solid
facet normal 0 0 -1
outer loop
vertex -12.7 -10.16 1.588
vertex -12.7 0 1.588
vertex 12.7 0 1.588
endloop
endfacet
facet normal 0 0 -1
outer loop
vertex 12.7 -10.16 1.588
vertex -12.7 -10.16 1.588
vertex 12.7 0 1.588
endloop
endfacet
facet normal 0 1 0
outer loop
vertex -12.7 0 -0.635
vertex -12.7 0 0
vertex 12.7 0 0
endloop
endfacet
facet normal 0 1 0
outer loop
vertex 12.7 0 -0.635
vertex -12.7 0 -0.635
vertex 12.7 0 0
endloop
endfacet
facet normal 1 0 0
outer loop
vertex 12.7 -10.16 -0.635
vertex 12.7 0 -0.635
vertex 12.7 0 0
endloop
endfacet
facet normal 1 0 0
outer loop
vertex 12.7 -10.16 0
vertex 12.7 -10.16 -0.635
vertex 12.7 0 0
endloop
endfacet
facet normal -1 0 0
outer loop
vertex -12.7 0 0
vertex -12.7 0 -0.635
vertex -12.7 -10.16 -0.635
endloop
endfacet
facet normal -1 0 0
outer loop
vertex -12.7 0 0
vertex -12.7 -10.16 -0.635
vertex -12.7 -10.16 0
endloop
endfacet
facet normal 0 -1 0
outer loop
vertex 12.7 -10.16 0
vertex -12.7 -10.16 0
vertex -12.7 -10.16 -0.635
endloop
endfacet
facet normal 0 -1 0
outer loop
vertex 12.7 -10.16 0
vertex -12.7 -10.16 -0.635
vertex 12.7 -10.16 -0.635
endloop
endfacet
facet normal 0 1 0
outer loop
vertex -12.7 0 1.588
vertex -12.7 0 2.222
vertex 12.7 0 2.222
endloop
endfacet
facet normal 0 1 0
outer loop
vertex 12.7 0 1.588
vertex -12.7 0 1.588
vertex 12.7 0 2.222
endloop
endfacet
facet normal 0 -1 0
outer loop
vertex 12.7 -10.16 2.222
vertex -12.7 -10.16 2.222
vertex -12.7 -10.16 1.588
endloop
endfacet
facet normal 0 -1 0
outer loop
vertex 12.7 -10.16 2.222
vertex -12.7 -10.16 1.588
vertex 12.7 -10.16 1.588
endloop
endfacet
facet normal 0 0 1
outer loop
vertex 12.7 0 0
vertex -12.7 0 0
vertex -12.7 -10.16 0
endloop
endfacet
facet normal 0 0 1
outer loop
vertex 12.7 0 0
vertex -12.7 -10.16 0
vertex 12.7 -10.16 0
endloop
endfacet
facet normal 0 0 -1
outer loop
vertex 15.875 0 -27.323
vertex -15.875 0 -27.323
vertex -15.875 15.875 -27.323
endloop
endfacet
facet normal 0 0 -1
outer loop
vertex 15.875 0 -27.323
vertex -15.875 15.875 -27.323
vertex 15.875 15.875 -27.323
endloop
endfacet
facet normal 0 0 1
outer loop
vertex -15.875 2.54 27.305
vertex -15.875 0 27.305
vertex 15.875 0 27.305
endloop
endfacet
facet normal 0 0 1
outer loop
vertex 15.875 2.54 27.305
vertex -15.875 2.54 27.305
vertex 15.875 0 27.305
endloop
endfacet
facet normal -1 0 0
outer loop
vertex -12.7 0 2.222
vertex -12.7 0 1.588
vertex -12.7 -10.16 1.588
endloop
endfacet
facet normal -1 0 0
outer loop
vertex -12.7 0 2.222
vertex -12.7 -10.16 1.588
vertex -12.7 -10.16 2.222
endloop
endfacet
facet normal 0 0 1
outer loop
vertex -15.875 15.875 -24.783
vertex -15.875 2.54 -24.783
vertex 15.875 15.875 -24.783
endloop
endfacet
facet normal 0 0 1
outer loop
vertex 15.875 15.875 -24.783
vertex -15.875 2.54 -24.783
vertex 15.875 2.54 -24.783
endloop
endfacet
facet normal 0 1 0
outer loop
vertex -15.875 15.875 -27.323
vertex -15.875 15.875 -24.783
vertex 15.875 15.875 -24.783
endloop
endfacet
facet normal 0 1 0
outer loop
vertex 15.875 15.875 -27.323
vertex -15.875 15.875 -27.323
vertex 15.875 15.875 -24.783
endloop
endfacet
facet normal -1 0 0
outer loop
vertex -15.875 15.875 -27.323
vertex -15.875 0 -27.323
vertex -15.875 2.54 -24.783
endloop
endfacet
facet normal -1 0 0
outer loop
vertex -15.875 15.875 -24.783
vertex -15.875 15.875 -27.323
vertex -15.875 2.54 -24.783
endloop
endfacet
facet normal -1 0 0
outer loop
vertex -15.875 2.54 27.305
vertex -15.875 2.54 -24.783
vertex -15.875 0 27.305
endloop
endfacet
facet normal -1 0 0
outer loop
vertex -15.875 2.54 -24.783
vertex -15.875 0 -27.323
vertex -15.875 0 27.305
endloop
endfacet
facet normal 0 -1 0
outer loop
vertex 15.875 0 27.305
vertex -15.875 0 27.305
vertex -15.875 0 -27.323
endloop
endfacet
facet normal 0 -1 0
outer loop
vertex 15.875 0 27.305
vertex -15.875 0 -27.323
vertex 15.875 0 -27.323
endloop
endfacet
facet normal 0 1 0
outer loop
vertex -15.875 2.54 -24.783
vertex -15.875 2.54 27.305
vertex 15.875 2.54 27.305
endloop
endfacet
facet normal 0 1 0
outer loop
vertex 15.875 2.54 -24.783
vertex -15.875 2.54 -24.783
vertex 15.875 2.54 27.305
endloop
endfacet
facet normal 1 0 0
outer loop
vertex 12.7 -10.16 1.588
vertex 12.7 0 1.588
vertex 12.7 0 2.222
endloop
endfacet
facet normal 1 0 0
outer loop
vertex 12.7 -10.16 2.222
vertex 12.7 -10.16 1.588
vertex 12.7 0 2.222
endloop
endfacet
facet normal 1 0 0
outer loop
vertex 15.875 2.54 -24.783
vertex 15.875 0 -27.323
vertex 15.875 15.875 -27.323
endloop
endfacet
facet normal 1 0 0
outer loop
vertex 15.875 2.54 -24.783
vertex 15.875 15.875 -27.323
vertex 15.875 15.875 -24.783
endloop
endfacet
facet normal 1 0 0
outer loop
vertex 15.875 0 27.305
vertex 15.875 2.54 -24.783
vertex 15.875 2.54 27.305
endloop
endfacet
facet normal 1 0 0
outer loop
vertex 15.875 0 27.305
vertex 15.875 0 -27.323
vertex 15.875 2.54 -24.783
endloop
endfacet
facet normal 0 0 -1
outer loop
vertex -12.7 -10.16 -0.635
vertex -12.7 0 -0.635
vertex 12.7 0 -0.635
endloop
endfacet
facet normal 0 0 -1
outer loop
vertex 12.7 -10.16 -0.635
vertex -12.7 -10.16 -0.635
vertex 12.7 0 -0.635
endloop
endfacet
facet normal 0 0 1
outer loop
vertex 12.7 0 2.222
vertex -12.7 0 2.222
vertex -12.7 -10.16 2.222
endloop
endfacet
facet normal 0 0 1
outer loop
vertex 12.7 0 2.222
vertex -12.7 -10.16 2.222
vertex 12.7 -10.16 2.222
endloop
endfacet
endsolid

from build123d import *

# Parameters (mm, degrees)
F1_W     = 25.4
F1_H     = 0.635
F3_DEPTH = 10.16
F2_W     = 31.75
F2_H     = 54.61
F4_DEPTH = 2.54
F5_W     = 31.75
F5_H     = 2.54
F6_DEPTH = 15.875


with BuildPart() as f3:
    # F1 (on Front) → F3 (new body)
    with BuildSketch(Plane.XZ):
        with Locations((0, 1.905)):
            Rectangle(F1_W, F1_H)
        with Locations((0, -0.3175)):
            Rectangle(F1_W, F1_H)
    extrude(amount=F3_DEPTH)


with BuildPart() as f4:
    # F2 (on face) → F4 (new body)
    with BuildSketch(Plane.XZ):
        Rectangle(F2_W, F2_H)
    extrude(amount=-F4_DEPTH)

    # F5 (on Front) → F6 (join)
    with BuildSketch(Plane.XZ):
        with Locations((0, -26.053451)):
            Rectangle(F5_W, F5_H)
    extrude(amount=-F6_DEPTH)


solid = Compound([f3.part, f4.part])
